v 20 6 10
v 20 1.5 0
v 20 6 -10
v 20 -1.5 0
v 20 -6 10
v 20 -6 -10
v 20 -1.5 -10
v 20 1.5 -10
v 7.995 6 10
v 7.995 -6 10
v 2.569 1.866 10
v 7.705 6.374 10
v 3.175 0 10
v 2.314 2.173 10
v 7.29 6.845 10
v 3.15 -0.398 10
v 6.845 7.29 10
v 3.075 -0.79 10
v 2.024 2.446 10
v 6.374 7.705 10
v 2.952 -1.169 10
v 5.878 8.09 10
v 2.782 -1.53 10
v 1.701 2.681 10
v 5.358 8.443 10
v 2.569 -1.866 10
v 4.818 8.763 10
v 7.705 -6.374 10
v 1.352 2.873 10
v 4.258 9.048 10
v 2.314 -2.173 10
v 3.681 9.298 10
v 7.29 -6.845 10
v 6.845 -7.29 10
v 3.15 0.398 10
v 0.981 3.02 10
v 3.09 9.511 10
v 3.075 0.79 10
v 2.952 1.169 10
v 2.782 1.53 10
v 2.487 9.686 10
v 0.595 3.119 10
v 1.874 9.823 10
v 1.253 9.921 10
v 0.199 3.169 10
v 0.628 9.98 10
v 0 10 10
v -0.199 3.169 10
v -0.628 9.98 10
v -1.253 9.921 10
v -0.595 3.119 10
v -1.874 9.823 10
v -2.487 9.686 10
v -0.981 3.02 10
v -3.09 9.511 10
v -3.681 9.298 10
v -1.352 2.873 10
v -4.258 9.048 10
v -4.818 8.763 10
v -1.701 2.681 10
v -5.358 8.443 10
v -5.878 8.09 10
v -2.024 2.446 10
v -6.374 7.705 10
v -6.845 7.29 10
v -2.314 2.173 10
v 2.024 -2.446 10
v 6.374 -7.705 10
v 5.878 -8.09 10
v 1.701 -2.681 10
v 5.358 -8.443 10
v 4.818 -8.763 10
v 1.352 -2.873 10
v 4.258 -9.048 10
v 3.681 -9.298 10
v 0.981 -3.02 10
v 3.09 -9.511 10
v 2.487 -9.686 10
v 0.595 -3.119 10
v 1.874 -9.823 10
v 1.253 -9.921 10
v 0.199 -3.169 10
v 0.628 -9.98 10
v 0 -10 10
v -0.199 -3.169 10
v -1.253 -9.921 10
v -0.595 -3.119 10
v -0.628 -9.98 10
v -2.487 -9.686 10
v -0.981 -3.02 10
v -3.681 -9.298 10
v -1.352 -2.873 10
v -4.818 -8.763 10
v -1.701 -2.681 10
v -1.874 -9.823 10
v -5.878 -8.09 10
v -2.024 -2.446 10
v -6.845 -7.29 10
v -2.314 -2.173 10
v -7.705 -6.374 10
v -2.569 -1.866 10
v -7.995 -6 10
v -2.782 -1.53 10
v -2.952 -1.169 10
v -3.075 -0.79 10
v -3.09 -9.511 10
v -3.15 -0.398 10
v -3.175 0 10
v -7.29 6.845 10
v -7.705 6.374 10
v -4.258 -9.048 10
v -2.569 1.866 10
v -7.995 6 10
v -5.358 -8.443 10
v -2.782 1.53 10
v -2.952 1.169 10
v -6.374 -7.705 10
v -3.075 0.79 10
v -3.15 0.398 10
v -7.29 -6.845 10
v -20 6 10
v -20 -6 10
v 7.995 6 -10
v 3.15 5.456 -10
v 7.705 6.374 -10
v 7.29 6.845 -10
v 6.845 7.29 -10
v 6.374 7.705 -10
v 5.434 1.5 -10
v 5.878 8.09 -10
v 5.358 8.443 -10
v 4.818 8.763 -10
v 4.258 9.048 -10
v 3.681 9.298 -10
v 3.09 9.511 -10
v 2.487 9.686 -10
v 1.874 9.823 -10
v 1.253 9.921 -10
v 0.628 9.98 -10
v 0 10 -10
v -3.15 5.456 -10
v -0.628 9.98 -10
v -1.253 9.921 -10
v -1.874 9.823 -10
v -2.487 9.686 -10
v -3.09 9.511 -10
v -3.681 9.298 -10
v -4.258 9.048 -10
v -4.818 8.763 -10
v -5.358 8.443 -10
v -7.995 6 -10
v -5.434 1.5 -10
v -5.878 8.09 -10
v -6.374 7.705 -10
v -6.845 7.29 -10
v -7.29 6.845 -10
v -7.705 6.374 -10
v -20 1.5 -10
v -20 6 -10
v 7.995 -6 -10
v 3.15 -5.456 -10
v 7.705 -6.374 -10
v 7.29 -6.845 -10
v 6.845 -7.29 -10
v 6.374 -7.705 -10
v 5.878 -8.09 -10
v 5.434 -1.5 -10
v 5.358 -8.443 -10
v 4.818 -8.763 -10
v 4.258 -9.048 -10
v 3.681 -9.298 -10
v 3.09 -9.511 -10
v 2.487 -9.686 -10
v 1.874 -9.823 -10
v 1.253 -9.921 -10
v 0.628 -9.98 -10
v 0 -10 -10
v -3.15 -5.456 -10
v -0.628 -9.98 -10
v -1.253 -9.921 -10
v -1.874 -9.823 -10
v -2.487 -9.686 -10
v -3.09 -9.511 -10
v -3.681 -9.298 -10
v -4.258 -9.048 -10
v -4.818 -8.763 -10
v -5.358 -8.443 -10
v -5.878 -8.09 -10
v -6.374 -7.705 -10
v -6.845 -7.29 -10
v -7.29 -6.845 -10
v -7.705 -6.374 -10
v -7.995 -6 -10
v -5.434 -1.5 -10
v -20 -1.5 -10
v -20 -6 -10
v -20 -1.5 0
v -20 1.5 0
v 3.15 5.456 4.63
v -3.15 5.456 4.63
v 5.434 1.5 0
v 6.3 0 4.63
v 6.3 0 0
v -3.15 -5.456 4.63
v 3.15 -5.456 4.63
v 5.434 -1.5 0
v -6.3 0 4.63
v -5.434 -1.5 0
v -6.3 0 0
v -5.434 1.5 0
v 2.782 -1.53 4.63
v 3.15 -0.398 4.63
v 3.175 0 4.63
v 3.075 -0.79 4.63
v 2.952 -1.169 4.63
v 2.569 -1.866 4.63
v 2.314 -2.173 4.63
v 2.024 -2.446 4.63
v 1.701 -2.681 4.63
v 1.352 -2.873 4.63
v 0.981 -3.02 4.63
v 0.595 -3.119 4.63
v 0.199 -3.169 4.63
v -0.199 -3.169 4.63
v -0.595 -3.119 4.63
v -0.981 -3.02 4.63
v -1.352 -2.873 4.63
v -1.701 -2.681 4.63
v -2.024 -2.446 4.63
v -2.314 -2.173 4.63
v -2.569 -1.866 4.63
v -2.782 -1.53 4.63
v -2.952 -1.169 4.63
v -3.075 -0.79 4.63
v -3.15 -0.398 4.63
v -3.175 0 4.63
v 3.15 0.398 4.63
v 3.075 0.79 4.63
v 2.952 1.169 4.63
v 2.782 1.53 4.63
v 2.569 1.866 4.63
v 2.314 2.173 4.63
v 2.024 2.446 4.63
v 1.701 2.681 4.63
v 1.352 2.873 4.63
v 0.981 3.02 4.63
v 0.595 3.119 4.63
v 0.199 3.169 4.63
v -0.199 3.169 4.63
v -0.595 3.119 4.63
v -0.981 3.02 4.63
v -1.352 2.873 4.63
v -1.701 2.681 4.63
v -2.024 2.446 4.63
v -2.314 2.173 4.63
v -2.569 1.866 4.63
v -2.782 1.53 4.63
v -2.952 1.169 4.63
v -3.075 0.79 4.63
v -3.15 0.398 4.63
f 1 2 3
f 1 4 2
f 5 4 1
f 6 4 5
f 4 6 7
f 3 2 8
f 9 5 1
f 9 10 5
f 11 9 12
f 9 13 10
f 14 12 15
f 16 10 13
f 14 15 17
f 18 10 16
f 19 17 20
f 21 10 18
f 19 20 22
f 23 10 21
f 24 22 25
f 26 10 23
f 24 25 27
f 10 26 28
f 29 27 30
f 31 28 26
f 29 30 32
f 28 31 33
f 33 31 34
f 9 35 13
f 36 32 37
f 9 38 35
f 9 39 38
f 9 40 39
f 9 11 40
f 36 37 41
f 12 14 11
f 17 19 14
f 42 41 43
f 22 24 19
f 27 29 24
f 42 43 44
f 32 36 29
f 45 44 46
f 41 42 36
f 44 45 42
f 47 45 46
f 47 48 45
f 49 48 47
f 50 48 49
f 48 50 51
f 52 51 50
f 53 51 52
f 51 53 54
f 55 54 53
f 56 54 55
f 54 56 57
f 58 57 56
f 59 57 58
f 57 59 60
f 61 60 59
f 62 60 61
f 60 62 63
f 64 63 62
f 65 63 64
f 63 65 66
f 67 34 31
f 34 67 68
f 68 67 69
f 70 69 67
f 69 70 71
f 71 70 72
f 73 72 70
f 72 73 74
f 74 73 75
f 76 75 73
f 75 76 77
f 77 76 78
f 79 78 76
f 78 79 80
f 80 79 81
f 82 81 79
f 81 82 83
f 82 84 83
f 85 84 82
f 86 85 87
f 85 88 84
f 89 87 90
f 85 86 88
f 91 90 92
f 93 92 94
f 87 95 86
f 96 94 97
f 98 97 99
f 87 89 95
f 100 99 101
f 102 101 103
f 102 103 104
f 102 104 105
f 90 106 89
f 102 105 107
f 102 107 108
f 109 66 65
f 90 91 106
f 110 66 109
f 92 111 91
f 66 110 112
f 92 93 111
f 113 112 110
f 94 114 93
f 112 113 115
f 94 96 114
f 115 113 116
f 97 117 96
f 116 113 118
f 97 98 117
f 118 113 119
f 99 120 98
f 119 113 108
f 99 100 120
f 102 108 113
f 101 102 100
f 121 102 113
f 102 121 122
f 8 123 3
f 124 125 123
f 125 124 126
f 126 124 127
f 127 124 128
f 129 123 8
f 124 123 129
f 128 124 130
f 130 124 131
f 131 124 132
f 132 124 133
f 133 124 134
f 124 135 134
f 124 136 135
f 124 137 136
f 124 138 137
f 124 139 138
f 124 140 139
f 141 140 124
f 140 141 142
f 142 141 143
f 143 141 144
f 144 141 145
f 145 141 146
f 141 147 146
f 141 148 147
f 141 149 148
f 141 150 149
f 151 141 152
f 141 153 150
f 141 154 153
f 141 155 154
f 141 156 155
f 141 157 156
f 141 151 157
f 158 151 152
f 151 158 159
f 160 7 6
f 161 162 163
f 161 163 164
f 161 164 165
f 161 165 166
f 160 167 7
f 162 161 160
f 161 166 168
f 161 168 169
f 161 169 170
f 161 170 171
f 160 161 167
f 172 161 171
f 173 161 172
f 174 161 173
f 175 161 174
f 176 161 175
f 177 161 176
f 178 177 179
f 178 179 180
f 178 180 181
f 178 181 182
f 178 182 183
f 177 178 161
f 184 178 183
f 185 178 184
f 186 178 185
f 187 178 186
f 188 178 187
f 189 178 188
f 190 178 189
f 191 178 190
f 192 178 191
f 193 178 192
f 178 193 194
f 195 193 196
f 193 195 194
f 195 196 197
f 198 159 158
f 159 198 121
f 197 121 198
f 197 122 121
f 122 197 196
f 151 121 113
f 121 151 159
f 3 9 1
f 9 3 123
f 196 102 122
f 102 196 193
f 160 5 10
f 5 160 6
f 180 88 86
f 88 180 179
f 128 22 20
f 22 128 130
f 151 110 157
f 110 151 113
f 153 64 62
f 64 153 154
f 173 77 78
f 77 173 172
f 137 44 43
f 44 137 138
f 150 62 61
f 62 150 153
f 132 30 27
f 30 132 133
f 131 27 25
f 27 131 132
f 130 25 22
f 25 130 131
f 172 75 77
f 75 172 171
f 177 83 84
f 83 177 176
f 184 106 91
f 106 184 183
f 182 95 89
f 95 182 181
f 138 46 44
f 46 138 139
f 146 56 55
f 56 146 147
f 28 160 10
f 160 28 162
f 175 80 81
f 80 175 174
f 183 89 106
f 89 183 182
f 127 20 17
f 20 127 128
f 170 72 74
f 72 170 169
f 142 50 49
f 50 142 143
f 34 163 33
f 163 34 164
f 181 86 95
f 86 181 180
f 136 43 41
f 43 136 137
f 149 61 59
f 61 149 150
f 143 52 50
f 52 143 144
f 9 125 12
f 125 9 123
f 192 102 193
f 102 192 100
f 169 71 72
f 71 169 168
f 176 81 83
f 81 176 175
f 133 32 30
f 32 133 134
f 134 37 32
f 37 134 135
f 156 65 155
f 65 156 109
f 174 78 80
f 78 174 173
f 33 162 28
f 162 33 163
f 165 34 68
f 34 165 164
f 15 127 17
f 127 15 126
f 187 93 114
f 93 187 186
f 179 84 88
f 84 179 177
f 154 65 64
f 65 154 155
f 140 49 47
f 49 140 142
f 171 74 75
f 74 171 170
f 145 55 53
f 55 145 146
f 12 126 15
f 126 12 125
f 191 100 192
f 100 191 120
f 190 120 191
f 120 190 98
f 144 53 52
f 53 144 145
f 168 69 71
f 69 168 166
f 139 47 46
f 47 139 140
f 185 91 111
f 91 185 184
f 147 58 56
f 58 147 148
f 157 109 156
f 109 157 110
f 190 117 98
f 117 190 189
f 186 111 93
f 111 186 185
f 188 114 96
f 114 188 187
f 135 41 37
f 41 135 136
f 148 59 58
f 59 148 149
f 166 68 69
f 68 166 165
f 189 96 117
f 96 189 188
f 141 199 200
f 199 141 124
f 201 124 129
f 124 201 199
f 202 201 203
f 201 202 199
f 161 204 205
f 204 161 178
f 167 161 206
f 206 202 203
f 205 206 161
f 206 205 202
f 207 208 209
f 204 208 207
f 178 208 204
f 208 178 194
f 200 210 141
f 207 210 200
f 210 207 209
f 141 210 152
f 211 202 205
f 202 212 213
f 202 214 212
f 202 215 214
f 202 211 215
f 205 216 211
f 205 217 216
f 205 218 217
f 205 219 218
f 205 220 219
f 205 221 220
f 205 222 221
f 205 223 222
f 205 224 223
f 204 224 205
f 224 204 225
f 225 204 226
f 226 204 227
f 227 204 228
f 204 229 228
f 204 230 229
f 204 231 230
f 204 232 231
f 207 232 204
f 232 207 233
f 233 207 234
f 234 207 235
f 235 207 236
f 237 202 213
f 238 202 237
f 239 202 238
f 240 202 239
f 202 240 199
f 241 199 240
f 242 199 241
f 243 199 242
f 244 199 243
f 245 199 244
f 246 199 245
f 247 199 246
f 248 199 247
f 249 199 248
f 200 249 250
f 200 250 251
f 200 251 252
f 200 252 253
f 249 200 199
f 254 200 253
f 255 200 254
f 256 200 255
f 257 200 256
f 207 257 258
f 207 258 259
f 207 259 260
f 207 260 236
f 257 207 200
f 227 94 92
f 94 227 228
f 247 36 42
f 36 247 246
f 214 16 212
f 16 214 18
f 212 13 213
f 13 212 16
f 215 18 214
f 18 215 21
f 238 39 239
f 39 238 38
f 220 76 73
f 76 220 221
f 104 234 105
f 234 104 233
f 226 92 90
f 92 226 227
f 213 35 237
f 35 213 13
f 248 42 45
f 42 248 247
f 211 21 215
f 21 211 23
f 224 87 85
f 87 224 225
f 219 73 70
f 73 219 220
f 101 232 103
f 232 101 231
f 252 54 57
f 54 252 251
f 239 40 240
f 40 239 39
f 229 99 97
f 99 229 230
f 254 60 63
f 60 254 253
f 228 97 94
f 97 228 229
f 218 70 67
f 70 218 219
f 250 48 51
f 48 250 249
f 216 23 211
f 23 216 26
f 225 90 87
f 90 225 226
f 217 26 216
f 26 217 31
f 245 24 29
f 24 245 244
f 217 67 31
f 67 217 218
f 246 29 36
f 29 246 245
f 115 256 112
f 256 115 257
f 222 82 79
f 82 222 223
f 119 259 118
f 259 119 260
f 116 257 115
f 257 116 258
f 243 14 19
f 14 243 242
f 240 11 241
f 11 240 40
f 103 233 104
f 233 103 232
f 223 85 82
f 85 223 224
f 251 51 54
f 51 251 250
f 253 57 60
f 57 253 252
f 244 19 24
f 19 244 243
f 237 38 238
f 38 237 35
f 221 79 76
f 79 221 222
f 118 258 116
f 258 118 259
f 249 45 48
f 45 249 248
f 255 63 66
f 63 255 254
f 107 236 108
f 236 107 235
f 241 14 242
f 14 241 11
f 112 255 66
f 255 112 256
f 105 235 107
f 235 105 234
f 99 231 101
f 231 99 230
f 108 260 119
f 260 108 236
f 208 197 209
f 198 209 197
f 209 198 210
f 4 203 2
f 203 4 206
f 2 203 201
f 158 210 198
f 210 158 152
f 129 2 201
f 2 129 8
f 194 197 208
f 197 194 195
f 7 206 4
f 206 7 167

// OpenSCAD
/**
 * Camera Stand
 * - with https://www.adafruit.com/product/1434
 * - and a stand like https://www.bhphotovideo.com/c/product/1453863-REG/camvate_c1180_1_4_20_mini_ball_head.html
 * - or https://www.amazon.com/gp/product/B000CNPK3M/ref=oh_aui_search_detailpage?ie=UTF8&psc=1
 *
 * Interesting ones at https://all3dp.com/raspberry-pi-camera-cases-mounts/
 */
 
use <../../mechanical.parts.scad> 
plateThickness = 3; 
baseScrewDiam = .25 * 25.4; // 6;
standThickness = 12;
standHeight = 20;
 
screwDim = getHBScrewDims(baseScrewDiam); 

screwLen = 30;

 module cameraStand() {
   
   difference() {
     union() {
       cube(size=[40, standThickness, standHeight], center=true);
       cylinder(d=20, h=standHeight, center=true, $fn=100);
     }
     translate([0, 0, -6]) {
       cube(size=[50, plateThickness, 12], center=true);
     }
     translate([0, 0, screwLen + screwDim[0]]) {
       rotate([180, 0, 0]) {
         metalScrewHB(baseScrewDiam, screwLen, top=20);
       }
     }
   }
 }
 
 cameraStand();
 
